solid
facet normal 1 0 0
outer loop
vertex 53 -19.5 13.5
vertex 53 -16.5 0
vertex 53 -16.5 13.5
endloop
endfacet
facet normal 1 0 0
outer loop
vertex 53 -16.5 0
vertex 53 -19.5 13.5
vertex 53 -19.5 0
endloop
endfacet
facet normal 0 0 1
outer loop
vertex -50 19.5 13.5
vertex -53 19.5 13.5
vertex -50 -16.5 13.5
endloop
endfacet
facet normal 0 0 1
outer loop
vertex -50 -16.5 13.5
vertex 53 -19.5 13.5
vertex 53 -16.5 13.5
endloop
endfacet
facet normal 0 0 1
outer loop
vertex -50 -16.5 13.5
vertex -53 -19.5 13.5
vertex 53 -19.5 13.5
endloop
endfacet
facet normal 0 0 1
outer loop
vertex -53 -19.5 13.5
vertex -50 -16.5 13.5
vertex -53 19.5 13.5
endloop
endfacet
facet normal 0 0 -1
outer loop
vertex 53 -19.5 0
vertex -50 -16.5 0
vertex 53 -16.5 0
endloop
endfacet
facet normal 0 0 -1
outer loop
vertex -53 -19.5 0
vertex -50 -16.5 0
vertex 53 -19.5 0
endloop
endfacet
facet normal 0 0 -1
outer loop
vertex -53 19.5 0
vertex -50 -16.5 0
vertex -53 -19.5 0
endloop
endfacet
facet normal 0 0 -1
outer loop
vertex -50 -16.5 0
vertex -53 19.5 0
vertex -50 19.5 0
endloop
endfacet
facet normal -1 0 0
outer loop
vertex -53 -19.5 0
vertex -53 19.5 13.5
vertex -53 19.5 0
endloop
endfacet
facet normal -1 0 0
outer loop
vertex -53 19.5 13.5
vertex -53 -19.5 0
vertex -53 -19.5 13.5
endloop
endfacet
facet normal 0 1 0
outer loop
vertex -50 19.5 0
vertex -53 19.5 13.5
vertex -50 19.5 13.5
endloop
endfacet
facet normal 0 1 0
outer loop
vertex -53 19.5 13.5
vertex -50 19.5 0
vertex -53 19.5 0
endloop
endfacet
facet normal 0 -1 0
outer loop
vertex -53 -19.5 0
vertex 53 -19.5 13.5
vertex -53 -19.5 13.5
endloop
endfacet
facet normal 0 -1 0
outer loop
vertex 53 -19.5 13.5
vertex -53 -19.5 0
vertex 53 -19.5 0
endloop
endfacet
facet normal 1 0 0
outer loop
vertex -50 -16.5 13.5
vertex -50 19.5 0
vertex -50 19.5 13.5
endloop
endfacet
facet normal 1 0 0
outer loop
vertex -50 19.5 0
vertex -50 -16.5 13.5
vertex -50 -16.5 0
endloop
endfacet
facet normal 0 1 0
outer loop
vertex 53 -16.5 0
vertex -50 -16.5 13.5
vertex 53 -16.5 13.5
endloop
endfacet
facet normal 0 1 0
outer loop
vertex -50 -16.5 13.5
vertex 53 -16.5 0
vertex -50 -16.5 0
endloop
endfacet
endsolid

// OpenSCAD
// file: BOSL2/std.scad
// Minimal BOSL2 compatibility shim for bundled gallery models.
// It implements only the helpers used by the imported OpenSCAD projects.

CENTER = [0, 0, 0];
BOTTOM = [0, 0, -1];
TOP = [0, 0, 1];
LEFT = [-1, 0, 0];
RIGHT = [1, 0, 0];
FRONT = [0, -1, 0];
BACK = [0, 1, 0];

module up(z=0) {
    translate([0, 0, z]) children();
}

module down(z=0) {
    translate([0, 0, -z]) children();
}

module attach(anchor=CENTER) {
    children();
}

module cuboid(size=[1, 1, 1], anchor=CENTER) {
    center = anchor == CENTER;
    translate(center ? [0, 0, 0] : [0, 0, size[2] / 2])
        cube(size, center=true);
    children();
}

module xcyl(h=1, r=1, anchor=CENTER) {
    center = anchor == CENTER;
    translate(center ? [0, 0, 0] : [h / 2, 0, 0])
        rotate([0, 90, 0])
            cylinder(h=h, r=r, center=true);
}
// main file
include <BOSL2/std.scad>

// Start config
// Panel Size
panel_size = [ 106, 39 ]; // mm
// Pi Board
pi_board_size = [ 51, 21 ];                                        // mm
pi_board_screw_holes_center_from_board_edge_distance = [ 2, 4.8 ]; // mm
pi_board_screw_holes_diameter = 2.1;                               // mm
pi_board_offset = [ 1.75, -1.0 ];
pi_board_usb_size = [ 8.5, 4.5 ];
pi_board_usb_rounding_radius = 0.5; // mm
// pi_board_inset_depth = 0.2; //mm (keep at zero for final)

// Screen
screen_pcb_size = [ 100.5, 33.5, 13.3 ];                                // mm (+- 0.2) 13.3mm are pin headers.
screen_pcb_screw_holes_center_from_board_edge_distance = [ 2.25, 2.5 ]; // mm
screen_pcb_screw_holes_diameter = 2.8;                                  // mm
screen_pcb_screw_holes_spacing = [ 95, 28.5 ];                          // mm
active_screen_area = [ 76.78, 19.18 ];                                  // mm (old: 13.86)
active_screen_area_offset_from_corner = [ 11.36, 5.1 ];                 // mm
screen_rounding_radius = 0.5;                                           // mm
screen_count = 1;

// Screws
m2_screw_head_depth = 1;      // mm it's 2mm normally
m2_screw_head_diameter = 4.0; // mm (adding .6mm for tolerances)
m2_screw_nut_depth = 1;       // mm it's 1.6mm normally
m2_screw_nut_diameter = 5.0;  // mm (adding .6mm for tolerances)
m2_screw_diameter = 2.4;      // mm

// Asanoha
back_asanoha_pattern_repeat = [ 9, 3 ]; // mm
asanoha_area_rounding_radius = 3;       // mm

// Stand
stand_size = [ 3, 6, 6 ];
stand_rounding_radius = 1.5;                // mm
stand_hinge_ball_diameter = 2;              // mm
stand_hinge_ball_offset = 0;                // mm
stand_panel_tolerance = 0.25;               // mm
stand_panel_thickness = 1.5;                // mm
stand_panel_rounding_radius = 1.5;          // mm
stand_asanoha_pattern_unit_length = 10.175; // mm
stand_asanoha_repeat = [ 9, 3 ];

// Misc
walls_depth = 13.5;    // mm
walls_thickness = 1.5; // mm
panel_thickness = 1.5; // mm
rounding_radius = 1.5; // mm

resolution = 80;
// End config

module panel()
{
    difference()
    {
        cuboid([ panel_size.x, panel_size.y, walls_depth ], rounding = rounding_radius,
               edges = [ FRONT + RIGHT, FRONT + LEFT, BACK + RIGHT, BACK + LEFT ], $fn = resolution,
               anchor = LEFT + BOTTOM + FRONT);
        translate([ walls_thickness, walls_thickness, 0 ])
            cuboid([ panel_size.x - walls_thickness * 2, panel_size.y - walls_thickness * 2, walls_depth ],
                   rounding = rounding_radius, edges = [ FRONT + RIGHT, FRONT + LEFT, BACK + RIGHT, BACK + LEFT ],
                   $fn = resolution, anchor = LEFT + BOTTOM + FRONT);
    }
}

module raspberry_pi_pico_micro_usb_port()
{
    translate([ 0, pi_board_size.y / 2 - pi_board_usb_size.x / 2, 0 ]) cuboid(
        [ walls_thickness * 2, pi_board_usb_size.x, pi_board_usb_size.y ], rounding = pi_board_usb_rounding_radius,
        edges = [ FRONT + TOP, BACK + TOP, BOTTOM + FRONT, BOTTOM + BACK ], $fn = resolution,
        anchor = LEFT + BOTTOM + FRONT);
}

module raspberry_pi_pico()
{
    rpip_anchor = [ 0, pi_board_offset.y + screen_anchor_coords.y, 0 ];
    // translate(rpip_anchor) translate ([0,0,panel_thickness-pi_board_inset_depth])
    // cube([pi_board_size.x,pi_board_size.y,pi_board_inset_depth]);
    translate(rpip_anchor) raspberry_pi_pico_micro_usb_port();
}

screen_anchor_coords =
    [ panel_size.x / 2 - screen_pcb_size.x / 2 * screen_count, panel_size.y / 2 - active_screen_area.y / 2, 0 ];
difference()
{
    panel();
    raspberry_pi_pico();
}
